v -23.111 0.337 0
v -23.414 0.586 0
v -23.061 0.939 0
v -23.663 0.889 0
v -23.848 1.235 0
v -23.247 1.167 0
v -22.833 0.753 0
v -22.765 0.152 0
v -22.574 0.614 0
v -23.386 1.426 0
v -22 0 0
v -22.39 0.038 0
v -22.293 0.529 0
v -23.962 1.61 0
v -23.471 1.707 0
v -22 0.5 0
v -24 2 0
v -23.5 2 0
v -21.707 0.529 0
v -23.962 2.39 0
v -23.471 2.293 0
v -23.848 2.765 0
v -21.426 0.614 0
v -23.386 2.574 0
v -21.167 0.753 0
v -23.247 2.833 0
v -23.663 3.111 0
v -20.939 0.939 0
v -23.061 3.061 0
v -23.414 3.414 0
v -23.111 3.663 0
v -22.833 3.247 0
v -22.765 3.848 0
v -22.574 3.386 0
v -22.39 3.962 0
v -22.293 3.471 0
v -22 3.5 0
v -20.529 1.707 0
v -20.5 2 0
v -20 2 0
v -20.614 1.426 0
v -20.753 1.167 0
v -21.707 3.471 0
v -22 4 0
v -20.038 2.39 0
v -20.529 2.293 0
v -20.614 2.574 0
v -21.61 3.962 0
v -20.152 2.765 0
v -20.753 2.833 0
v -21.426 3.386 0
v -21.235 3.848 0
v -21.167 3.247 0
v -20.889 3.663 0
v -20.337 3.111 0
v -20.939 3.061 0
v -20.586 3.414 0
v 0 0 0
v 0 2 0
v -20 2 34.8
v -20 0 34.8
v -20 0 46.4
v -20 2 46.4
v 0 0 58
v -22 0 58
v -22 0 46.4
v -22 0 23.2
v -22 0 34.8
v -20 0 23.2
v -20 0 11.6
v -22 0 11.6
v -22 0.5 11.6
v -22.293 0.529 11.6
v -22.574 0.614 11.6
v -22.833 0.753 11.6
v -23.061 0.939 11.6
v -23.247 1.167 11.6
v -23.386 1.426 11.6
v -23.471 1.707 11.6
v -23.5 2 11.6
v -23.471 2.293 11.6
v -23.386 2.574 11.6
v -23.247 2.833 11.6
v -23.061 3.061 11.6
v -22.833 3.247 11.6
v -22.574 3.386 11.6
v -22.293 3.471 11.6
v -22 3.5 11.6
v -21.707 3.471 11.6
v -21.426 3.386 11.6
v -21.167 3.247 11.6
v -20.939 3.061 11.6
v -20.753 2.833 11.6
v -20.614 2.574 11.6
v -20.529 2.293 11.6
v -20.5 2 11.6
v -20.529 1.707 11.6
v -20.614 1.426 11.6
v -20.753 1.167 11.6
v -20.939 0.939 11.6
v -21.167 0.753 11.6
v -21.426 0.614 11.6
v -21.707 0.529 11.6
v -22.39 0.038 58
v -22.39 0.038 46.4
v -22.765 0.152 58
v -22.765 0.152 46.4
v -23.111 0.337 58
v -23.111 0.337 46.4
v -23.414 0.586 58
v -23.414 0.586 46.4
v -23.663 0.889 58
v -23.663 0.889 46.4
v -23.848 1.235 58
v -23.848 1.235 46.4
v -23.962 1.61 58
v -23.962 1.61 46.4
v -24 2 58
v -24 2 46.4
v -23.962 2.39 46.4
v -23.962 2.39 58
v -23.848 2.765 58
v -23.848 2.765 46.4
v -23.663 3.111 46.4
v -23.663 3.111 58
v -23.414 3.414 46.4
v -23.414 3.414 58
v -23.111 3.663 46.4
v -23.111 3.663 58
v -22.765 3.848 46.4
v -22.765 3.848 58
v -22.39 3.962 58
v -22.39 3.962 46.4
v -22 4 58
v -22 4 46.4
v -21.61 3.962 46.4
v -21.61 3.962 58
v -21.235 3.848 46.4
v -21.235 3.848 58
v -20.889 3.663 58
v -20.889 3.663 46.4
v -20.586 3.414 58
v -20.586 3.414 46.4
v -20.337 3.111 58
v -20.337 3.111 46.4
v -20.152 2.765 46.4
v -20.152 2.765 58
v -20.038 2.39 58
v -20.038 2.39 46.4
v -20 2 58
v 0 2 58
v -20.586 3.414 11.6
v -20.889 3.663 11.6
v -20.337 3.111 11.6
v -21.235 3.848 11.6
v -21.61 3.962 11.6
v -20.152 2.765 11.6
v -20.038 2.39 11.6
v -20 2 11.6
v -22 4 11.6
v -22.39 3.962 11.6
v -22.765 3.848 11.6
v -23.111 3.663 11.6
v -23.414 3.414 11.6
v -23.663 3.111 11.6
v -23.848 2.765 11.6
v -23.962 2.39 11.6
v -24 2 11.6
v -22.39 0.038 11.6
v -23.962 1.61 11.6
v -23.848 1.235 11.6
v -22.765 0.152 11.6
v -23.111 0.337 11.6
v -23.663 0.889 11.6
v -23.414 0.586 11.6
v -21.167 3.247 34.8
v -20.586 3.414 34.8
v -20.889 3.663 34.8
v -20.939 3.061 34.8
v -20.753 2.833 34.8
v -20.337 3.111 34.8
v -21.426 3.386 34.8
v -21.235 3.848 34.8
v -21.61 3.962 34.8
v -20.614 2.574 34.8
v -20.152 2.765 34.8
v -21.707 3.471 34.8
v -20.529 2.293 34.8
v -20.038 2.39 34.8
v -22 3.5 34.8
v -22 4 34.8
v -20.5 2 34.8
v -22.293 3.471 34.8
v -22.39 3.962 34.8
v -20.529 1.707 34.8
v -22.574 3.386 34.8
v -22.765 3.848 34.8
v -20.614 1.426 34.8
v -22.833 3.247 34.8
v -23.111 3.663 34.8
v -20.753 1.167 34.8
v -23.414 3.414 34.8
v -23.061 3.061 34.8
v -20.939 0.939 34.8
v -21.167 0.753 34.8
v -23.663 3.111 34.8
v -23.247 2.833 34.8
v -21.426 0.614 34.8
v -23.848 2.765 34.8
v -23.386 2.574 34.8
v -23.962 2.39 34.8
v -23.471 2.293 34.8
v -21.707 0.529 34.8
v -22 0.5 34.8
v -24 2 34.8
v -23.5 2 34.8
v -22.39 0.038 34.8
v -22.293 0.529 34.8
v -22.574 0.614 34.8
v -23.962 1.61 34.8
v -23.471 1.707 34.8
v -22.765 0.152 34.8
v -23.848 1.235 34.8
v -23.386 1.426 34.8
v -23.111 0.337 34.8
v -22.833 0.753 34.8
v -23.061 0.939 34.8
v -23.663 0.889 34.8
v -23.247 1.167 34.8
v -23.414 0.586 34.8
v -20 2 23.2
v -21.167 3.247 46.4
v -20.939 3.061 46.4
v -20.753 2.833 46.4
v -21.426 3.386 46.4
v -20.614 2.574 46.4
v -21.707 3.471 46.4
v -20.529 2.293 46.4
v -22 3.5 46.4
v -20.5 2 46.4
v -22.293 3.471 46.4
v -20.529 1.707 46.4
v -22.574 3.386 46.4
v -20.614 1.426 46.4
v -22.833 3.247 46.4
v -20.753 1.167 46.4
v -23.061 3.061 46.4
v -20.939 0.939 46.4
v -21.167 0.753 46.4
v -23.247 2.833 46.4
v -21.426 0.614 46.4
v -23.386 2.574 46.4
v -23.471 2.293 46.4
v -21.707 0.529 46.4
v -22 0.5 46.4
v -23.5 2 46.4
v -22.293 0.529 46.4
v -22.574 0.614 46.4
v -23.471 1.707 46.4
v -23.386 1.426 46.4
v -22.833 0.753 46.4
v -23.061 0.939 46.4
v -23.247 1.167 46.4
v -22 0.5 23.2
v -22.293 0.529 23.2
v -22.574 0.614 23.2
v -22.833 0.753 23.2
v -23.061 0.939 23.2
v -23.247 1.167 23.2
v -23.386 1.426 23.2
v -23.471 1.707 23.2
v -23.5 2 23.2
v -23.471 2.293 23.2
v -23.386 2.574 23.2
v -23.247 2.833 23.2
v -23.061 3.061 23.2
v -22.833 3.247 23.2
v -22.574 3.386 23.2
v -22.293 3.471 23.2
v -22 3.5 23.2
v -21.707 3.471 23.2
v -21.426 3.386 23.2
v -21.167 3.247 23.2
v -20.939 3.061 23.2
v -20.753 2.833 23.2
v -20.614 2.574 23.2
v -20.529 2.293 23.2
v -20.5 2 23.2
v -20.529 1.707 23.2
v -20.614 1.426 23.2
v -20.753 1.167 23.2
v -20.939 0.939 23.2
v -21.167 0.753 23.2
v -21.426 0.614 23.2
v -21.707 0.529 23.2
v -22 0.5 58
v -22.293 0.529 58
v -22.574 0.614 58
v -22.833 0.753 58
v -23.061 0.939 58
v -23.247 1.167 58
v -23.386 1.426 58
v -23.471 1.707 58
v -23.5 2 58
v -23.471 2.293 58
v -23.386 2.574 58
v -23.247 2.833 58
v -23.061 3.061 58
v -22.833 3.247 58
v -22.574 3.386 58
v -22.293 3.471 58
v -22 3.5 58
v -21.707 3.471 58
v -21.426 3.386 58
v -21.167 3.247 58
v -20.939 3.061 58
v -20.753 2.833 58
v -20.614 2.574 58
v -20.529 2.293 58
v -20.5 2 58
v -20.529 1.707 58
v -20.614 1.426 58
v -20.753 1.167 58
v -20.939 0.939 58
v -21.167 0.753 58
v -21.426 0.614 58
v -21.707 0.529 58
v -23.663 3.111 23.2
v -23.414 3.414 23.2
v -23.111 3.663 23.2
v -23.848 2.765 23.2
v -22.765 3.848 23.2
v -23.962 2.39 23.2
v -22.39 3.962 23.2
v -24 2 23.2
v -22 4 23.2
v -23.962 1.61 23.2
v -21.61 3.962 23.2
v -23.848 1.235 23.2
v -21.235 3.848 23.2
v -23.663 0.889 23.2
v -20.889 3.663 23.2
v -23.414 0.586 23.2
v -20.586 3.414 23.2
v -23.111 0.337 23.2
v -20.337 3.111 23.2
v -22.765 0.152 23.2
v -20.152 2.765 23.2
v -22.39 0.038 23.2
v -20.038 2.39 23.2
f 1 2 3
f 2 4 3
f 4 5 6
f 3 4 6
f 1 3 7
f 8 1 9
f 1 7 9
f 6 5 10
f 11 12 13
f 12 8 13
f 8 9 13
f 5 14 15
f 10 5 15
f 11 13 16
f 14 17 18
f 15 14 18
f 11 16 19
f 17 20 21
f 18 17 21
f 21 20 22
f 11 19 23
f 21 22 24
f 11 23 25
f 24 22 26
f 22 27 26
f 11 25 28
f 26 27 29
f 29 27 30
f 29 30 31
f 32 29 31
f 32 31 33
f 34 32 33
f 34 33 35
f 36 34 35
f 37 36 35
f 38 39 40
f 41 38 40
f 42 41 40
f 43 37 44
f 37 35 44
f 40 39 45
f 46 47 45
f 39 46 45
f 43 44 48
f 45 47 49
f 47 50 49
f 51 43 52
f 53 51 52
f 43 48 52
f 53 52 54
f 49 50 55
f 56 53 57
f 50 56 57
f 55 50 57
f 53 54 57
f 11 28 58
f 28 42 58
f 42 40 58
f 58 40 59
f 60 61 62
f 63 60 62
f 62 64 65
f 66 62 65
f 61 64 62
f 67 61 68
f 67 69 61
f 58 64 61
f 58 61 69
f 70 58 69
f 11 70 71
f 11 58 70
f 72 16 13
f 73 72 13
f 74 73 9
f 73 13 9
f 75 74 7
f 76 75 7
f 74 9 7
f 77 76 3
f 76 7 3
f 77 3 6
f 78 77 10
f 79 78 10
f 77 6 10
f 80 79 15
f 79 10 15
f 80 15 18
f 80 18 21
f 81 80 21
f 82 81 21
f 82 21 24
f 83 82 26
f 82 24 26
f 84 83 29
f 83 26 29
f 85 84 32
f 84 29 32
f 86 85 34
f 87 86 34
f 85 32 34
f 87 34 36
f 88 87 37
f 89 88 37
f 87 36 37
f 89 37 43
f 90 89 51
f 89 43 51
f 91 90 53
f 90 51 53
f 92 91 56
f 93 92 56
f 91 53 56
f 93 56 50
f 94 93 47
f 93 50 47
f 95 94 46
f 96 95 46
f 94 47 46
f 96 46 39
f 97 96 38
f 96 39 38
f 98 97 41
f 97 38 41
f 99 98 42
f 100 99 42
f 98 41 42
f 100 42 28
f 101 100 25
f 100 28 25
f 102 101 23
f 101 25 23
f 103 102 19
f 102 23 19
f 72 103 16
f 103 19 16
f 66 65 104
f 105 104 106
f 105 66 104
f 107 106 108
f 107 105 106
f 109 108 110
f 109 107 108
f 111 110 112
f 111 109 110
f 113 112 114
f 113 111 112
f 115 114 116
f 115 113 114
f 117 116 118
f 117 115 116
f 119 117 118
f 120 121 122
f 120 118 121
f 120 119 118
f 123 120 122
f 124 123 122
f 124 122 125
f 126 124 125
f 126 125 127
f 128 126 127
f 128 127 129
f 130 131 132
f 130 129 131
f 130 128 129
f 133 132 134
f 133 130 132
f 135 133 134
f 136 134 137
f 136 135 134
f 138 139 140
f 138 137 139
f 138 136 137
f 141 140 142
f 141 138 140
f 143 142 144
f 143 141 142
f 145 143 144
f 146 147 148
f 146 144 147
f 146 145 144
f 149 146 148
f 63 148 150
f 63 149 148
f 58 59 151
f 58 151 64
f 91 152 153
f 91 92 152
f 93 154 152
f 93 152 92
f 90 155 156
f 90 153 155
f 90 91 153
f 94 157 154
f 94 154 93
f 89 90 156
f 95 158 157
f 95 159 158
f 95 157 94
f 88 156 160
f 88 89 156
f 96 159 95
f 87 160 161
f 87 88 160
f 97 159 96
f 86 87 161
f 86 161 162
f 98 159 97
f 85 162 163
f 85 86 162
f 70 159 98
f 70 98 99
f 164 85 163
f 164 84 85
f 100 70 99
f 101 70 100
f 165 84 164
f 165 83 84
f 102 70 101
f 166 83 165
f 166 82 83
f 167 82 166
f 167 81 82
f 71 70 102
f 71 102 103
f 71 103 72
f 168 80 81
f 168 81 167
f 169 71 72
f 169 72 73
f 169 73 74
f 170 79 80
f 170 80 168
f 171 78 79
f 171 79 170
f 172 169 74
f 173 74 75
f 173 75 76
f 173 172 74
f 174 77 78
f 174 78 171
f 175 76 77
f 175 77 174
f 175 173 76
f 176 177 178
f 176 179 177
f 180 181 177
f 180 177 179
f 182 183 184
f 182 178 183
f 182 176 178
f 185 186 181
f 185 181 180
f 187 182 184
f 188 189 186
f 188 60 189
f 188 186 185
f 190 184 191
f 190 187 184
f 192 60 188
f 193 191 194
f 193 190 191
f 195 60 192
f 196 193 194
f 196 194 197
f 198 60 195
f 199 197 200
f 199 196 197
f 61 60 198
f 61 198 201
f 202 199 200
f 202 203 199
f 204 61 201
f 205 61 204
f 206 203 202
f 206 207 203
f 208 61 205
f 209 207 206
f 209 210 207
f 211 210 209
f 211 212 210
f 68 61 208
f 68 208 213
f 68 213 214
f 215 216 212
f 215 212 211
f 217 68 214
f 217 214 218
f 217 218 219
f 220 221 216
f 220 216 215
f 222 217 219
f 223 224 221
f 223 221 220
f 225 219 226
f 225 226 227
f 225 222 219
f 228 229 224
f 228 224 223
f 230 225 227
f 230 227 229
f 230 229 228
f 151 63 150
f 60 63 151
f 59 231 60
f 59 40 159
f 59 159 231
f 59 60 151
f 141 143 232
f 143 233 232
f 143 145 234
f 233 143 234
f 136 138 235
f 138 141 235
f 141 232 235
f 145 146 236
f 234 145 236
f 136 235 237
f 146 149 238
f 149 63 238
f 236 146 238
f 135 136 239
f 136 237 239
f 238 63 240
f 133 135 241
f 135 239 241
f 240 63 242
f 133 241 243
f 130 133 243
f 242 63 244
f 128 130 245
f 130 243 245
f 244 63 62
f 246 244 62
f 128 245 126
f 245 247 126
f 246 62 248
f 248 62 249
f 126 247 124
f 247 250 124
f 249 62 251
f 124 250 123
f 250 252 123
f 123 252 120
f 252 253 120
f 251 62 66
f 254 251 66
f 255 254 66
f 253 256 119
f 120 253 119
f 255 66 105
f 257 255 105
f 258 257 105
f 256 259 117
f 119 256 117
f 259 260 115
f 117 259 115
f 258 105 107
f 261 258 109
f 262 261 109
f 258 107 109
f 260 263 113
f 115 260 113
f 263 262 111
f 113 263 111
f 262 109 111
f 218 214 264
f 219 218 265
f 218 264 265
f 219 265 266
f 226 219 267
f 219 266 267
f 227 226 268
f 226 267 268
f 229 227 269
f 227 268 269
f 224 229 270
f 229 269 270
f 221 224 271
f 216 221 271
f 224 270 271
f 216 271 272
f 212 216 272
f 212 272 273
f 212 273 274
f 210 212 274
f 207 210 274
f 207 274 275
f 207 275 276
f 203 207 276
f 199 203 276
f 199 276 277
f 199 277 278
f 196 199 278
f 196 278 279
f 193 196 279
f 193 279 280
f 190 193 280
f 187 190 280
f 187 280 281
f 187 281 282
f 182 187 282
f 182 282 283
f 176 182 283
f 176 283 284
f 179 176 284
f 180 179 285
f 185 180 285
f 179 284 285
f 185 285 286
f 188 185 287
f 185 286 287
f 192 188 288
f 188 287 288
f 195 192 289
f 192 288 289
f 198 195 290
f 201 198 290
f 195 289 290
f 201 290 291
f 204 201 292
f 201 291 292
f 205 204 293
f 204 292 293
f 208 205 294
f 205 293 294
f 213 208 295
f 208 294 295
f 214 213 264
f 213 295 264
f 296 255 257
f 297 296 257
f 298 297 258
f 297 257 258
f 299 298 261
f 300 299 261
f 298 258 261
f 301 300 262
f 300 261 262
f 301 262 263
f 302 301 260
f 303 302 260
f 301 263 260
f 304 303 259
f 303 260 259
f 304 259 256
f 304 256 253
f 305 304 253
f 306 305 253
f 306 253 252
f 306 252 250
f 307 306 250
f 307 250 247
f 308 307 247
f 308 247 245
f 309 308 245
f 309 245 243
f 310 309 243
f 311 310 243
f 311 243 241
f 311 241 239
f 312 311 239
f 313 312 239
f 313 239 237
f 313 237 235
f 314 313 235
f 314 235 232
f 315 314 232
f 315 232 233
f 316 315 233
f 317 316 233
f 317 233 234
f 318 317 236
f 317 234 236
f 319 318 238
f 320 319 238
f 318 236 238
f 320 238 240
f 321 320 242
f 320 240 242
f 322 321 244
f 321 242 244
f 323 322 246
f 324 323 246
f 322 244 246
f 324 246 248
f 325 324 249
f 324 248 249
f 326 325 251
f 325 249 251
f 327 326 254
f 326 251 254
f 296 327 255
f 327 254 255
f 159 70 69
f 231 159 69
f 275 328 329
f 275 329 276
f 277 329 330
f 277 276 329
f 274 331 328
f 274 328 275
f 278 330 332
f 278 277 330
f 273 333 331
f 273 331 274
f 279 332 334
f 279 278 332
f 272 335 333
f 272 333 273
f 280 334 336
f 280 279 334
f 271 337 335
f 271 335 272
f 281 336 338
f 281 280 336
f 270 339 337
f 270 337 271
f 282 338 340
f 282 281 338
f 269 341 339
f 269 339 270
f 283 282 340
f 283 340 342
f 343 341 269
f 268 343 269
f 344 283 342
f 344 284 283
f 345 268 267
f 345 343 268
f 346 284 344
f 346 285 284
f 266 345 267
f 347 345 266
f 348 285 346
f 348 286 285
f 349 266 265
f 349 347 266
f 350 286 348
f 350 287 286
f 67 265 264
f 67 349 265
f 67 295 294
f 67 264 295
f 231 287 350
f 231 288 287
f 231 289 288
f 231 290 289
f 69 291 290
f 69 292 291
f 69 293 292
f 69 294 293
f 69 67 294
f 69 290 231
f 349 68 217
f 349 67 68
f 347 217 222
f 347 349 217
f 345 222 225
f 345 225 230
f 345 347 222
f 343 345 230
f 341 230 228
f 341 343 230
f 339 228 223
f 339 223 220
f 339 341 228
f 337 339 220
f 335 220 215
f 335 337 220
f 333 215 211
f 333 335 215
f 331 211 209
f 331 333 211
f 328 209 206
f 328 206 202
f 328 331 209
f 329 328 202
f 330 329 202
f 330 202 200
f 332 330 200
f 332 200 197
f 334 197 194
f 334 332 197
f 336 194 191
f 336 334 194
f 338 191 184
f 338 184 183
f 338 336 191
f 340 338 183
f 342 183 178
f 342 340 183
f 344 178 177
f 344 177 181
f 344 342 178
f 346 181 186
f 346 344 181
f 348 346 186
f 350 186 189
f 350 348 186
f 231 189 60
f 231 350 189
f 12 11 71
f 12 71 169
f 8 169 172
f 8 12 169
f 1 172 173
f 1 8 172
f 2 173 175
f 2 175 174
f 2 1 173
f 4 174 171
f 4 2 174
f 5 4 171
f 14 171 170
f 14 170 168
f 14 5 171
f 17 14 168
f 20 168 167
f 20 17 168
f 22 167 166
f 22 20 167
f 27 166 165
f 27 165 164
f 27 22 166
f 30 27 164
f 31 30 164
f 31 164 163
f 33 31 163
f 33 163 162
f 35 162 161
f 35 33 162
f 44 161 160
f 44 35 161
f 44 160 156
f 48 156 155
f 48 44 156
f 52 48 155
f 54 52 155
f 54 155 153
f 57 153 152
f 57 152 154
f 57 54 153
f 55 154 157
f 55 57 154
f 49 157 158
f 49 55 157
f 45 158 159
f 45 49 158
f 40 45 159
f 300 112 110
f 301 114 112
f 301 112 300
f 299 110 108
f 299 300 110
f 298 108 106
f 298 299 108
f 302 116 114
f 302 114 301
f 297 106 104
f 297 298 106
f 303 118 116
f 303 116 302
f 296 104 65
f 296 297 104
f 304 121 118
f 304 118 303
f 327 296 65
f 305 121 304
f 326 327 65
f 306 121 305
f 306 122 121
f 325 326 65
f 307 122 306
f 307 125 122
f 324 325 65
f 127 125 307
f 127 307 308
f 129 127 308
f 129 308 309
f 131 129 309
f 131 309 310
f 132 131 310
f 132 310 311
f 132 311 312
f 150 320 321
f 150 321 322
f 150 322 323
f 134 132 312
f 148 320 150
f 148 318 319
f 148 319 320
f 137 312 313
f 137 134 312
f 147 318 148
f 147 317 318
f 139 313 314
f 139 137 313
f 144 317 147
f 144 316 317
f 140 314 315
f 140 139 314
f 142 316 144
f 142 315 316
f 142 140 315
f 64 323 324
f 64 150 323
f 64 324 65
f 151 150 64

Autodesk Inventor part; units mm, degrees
ref_plane "YZ Plane" through (0, 0, 0) normal (1, 0, 0) x (0, 1, 0)
ref_plane "XZ Plane" through (0, 0, 0) normal (0, 1, 0) x (-1, 0, 0)
ref_plane "XY Plane" through (0, 0, 0) normal (0, 0, 1) x (1, 0, 0)
sketch "Sketch1" plane through (0, 0, 0) normal (0, 0, 1) x (1, 0, 0)
  line L0 (0, 0) -> (-20, 0)
  line L1 (-20, 0) -> (-20, 2)
  line L2 (-20, 2) -> (0, 2)
  line L3 (0, 2) -> (0, 0)
  line L4 (-20, 2) -> (-22, 2)
  line L5 (-22, 2) -> (-22, 4)
  circle A0 centre (-22, 2) radius 2
  line L6 (-22, 0) -> (-20, 0)
  dimension "d0" = 20
  dimension "d1" = 2
  dimension "d2" = 2
  dimension "d3" = 2
extrude "Extrusion1" add sketch "Sketch1" along normal blind 58
sketch "Sketch2" plane through (-20, 2, 0) normal (0, 1, 0) x (1, 0, 0)
  line L0 (0, 0) -> (-2, 0) projected
  line L1 (-2, 0) -> (-2, -58) projected
  line L2 (0, -58) -> (-2, -58) projected
  line L3 (0, 0) -> (0, -58) projected
  line L4 (20, 0) -> (0, 0) projected
  line L5 (0, 0) -> (0, -58) projected
  line L6 (20, -58) -> (0, -58) projected
  line L7 (20, 0) -> (20, -58) projected
  line L8 (-4, -58) -> (0, -58) projected
  line L9 (-4, -58) -> (0, -58)
  line L10 (0, -58) -> (0, -46.4)
  line L11 (0, -46.4) -> (-4, -46.4)
  line L12 (-4, -46.4) -> (-4, -58)
  line L13 (-4, -46.4) -> (0, -46.4)
  line L14 (0, -46.4) -> (0, -34.8)
  line L15 (0, -34.8) -> (-4, -34.8)
  line L16 (-4, -34.8) -> (-4, -46.4)
  line L17 (-4, 0) -> (-4, -58) projected
  line L18 (0, -34.8) -> (-4, -34.8)
  line L19 (-4, -34.8) -> (-4, -23.2)
  line L20 (-4, -23.2) -> (0, -23.2)
  line L21 (0, -23.2) -> (0, -34.8)
  line L22 (-4, -23.2) -> (0, -23.2)
  line L23 (0, -23.2) -> (0, -11.6)
  line L24 (0, -11.6) -> (-4, -11.6)
  line L25 (-4, -11.6) -> (-4, -23.2)
  line L26 (0, -11.6) -> (-4, -11.6)
  line L27 (-4, -11.6) -> (-4, 0)
  line L28 (-4, 0) -> (0, 0)
  line L29 (0, 0) -> (0, -11.6)
  point P0 (0, -11.6)
  point P1 (-4, -11.6)
  point P2 (0, -23.2)
  dimension "d6" = 11.6
  dimension "d7" = 11.6
  dimension "d8" = 11.6
  dimension "d9" = 11.6
extrude "Extrusion2" cut sketch "Sketch2" along normal mid plane 4 contours L3 L20 L1 L24 | L1 L20 L17 L24 | L3 L11 L1 L15 | L1 L11 L16 L15
sketch "Sketch3" plane through (0, 0, 58) normal (0, 0, 1) x (1, 0, 0)
  line L0 (-22, 0) -> (0, 0) projected
  line L1 (0, 0) -> (0, 2) projected
  line L2 (0, 2) -> (-20, 2) projected
  arc A0 (-20, 2) -> (-22, 0) centre (-22, 2) ccw projected
hole "Hole1" at (-22, 2, 58) direction (0, 0, -1) diameter 3 end through all
properties part number "SchnierTeilA_CPY"
